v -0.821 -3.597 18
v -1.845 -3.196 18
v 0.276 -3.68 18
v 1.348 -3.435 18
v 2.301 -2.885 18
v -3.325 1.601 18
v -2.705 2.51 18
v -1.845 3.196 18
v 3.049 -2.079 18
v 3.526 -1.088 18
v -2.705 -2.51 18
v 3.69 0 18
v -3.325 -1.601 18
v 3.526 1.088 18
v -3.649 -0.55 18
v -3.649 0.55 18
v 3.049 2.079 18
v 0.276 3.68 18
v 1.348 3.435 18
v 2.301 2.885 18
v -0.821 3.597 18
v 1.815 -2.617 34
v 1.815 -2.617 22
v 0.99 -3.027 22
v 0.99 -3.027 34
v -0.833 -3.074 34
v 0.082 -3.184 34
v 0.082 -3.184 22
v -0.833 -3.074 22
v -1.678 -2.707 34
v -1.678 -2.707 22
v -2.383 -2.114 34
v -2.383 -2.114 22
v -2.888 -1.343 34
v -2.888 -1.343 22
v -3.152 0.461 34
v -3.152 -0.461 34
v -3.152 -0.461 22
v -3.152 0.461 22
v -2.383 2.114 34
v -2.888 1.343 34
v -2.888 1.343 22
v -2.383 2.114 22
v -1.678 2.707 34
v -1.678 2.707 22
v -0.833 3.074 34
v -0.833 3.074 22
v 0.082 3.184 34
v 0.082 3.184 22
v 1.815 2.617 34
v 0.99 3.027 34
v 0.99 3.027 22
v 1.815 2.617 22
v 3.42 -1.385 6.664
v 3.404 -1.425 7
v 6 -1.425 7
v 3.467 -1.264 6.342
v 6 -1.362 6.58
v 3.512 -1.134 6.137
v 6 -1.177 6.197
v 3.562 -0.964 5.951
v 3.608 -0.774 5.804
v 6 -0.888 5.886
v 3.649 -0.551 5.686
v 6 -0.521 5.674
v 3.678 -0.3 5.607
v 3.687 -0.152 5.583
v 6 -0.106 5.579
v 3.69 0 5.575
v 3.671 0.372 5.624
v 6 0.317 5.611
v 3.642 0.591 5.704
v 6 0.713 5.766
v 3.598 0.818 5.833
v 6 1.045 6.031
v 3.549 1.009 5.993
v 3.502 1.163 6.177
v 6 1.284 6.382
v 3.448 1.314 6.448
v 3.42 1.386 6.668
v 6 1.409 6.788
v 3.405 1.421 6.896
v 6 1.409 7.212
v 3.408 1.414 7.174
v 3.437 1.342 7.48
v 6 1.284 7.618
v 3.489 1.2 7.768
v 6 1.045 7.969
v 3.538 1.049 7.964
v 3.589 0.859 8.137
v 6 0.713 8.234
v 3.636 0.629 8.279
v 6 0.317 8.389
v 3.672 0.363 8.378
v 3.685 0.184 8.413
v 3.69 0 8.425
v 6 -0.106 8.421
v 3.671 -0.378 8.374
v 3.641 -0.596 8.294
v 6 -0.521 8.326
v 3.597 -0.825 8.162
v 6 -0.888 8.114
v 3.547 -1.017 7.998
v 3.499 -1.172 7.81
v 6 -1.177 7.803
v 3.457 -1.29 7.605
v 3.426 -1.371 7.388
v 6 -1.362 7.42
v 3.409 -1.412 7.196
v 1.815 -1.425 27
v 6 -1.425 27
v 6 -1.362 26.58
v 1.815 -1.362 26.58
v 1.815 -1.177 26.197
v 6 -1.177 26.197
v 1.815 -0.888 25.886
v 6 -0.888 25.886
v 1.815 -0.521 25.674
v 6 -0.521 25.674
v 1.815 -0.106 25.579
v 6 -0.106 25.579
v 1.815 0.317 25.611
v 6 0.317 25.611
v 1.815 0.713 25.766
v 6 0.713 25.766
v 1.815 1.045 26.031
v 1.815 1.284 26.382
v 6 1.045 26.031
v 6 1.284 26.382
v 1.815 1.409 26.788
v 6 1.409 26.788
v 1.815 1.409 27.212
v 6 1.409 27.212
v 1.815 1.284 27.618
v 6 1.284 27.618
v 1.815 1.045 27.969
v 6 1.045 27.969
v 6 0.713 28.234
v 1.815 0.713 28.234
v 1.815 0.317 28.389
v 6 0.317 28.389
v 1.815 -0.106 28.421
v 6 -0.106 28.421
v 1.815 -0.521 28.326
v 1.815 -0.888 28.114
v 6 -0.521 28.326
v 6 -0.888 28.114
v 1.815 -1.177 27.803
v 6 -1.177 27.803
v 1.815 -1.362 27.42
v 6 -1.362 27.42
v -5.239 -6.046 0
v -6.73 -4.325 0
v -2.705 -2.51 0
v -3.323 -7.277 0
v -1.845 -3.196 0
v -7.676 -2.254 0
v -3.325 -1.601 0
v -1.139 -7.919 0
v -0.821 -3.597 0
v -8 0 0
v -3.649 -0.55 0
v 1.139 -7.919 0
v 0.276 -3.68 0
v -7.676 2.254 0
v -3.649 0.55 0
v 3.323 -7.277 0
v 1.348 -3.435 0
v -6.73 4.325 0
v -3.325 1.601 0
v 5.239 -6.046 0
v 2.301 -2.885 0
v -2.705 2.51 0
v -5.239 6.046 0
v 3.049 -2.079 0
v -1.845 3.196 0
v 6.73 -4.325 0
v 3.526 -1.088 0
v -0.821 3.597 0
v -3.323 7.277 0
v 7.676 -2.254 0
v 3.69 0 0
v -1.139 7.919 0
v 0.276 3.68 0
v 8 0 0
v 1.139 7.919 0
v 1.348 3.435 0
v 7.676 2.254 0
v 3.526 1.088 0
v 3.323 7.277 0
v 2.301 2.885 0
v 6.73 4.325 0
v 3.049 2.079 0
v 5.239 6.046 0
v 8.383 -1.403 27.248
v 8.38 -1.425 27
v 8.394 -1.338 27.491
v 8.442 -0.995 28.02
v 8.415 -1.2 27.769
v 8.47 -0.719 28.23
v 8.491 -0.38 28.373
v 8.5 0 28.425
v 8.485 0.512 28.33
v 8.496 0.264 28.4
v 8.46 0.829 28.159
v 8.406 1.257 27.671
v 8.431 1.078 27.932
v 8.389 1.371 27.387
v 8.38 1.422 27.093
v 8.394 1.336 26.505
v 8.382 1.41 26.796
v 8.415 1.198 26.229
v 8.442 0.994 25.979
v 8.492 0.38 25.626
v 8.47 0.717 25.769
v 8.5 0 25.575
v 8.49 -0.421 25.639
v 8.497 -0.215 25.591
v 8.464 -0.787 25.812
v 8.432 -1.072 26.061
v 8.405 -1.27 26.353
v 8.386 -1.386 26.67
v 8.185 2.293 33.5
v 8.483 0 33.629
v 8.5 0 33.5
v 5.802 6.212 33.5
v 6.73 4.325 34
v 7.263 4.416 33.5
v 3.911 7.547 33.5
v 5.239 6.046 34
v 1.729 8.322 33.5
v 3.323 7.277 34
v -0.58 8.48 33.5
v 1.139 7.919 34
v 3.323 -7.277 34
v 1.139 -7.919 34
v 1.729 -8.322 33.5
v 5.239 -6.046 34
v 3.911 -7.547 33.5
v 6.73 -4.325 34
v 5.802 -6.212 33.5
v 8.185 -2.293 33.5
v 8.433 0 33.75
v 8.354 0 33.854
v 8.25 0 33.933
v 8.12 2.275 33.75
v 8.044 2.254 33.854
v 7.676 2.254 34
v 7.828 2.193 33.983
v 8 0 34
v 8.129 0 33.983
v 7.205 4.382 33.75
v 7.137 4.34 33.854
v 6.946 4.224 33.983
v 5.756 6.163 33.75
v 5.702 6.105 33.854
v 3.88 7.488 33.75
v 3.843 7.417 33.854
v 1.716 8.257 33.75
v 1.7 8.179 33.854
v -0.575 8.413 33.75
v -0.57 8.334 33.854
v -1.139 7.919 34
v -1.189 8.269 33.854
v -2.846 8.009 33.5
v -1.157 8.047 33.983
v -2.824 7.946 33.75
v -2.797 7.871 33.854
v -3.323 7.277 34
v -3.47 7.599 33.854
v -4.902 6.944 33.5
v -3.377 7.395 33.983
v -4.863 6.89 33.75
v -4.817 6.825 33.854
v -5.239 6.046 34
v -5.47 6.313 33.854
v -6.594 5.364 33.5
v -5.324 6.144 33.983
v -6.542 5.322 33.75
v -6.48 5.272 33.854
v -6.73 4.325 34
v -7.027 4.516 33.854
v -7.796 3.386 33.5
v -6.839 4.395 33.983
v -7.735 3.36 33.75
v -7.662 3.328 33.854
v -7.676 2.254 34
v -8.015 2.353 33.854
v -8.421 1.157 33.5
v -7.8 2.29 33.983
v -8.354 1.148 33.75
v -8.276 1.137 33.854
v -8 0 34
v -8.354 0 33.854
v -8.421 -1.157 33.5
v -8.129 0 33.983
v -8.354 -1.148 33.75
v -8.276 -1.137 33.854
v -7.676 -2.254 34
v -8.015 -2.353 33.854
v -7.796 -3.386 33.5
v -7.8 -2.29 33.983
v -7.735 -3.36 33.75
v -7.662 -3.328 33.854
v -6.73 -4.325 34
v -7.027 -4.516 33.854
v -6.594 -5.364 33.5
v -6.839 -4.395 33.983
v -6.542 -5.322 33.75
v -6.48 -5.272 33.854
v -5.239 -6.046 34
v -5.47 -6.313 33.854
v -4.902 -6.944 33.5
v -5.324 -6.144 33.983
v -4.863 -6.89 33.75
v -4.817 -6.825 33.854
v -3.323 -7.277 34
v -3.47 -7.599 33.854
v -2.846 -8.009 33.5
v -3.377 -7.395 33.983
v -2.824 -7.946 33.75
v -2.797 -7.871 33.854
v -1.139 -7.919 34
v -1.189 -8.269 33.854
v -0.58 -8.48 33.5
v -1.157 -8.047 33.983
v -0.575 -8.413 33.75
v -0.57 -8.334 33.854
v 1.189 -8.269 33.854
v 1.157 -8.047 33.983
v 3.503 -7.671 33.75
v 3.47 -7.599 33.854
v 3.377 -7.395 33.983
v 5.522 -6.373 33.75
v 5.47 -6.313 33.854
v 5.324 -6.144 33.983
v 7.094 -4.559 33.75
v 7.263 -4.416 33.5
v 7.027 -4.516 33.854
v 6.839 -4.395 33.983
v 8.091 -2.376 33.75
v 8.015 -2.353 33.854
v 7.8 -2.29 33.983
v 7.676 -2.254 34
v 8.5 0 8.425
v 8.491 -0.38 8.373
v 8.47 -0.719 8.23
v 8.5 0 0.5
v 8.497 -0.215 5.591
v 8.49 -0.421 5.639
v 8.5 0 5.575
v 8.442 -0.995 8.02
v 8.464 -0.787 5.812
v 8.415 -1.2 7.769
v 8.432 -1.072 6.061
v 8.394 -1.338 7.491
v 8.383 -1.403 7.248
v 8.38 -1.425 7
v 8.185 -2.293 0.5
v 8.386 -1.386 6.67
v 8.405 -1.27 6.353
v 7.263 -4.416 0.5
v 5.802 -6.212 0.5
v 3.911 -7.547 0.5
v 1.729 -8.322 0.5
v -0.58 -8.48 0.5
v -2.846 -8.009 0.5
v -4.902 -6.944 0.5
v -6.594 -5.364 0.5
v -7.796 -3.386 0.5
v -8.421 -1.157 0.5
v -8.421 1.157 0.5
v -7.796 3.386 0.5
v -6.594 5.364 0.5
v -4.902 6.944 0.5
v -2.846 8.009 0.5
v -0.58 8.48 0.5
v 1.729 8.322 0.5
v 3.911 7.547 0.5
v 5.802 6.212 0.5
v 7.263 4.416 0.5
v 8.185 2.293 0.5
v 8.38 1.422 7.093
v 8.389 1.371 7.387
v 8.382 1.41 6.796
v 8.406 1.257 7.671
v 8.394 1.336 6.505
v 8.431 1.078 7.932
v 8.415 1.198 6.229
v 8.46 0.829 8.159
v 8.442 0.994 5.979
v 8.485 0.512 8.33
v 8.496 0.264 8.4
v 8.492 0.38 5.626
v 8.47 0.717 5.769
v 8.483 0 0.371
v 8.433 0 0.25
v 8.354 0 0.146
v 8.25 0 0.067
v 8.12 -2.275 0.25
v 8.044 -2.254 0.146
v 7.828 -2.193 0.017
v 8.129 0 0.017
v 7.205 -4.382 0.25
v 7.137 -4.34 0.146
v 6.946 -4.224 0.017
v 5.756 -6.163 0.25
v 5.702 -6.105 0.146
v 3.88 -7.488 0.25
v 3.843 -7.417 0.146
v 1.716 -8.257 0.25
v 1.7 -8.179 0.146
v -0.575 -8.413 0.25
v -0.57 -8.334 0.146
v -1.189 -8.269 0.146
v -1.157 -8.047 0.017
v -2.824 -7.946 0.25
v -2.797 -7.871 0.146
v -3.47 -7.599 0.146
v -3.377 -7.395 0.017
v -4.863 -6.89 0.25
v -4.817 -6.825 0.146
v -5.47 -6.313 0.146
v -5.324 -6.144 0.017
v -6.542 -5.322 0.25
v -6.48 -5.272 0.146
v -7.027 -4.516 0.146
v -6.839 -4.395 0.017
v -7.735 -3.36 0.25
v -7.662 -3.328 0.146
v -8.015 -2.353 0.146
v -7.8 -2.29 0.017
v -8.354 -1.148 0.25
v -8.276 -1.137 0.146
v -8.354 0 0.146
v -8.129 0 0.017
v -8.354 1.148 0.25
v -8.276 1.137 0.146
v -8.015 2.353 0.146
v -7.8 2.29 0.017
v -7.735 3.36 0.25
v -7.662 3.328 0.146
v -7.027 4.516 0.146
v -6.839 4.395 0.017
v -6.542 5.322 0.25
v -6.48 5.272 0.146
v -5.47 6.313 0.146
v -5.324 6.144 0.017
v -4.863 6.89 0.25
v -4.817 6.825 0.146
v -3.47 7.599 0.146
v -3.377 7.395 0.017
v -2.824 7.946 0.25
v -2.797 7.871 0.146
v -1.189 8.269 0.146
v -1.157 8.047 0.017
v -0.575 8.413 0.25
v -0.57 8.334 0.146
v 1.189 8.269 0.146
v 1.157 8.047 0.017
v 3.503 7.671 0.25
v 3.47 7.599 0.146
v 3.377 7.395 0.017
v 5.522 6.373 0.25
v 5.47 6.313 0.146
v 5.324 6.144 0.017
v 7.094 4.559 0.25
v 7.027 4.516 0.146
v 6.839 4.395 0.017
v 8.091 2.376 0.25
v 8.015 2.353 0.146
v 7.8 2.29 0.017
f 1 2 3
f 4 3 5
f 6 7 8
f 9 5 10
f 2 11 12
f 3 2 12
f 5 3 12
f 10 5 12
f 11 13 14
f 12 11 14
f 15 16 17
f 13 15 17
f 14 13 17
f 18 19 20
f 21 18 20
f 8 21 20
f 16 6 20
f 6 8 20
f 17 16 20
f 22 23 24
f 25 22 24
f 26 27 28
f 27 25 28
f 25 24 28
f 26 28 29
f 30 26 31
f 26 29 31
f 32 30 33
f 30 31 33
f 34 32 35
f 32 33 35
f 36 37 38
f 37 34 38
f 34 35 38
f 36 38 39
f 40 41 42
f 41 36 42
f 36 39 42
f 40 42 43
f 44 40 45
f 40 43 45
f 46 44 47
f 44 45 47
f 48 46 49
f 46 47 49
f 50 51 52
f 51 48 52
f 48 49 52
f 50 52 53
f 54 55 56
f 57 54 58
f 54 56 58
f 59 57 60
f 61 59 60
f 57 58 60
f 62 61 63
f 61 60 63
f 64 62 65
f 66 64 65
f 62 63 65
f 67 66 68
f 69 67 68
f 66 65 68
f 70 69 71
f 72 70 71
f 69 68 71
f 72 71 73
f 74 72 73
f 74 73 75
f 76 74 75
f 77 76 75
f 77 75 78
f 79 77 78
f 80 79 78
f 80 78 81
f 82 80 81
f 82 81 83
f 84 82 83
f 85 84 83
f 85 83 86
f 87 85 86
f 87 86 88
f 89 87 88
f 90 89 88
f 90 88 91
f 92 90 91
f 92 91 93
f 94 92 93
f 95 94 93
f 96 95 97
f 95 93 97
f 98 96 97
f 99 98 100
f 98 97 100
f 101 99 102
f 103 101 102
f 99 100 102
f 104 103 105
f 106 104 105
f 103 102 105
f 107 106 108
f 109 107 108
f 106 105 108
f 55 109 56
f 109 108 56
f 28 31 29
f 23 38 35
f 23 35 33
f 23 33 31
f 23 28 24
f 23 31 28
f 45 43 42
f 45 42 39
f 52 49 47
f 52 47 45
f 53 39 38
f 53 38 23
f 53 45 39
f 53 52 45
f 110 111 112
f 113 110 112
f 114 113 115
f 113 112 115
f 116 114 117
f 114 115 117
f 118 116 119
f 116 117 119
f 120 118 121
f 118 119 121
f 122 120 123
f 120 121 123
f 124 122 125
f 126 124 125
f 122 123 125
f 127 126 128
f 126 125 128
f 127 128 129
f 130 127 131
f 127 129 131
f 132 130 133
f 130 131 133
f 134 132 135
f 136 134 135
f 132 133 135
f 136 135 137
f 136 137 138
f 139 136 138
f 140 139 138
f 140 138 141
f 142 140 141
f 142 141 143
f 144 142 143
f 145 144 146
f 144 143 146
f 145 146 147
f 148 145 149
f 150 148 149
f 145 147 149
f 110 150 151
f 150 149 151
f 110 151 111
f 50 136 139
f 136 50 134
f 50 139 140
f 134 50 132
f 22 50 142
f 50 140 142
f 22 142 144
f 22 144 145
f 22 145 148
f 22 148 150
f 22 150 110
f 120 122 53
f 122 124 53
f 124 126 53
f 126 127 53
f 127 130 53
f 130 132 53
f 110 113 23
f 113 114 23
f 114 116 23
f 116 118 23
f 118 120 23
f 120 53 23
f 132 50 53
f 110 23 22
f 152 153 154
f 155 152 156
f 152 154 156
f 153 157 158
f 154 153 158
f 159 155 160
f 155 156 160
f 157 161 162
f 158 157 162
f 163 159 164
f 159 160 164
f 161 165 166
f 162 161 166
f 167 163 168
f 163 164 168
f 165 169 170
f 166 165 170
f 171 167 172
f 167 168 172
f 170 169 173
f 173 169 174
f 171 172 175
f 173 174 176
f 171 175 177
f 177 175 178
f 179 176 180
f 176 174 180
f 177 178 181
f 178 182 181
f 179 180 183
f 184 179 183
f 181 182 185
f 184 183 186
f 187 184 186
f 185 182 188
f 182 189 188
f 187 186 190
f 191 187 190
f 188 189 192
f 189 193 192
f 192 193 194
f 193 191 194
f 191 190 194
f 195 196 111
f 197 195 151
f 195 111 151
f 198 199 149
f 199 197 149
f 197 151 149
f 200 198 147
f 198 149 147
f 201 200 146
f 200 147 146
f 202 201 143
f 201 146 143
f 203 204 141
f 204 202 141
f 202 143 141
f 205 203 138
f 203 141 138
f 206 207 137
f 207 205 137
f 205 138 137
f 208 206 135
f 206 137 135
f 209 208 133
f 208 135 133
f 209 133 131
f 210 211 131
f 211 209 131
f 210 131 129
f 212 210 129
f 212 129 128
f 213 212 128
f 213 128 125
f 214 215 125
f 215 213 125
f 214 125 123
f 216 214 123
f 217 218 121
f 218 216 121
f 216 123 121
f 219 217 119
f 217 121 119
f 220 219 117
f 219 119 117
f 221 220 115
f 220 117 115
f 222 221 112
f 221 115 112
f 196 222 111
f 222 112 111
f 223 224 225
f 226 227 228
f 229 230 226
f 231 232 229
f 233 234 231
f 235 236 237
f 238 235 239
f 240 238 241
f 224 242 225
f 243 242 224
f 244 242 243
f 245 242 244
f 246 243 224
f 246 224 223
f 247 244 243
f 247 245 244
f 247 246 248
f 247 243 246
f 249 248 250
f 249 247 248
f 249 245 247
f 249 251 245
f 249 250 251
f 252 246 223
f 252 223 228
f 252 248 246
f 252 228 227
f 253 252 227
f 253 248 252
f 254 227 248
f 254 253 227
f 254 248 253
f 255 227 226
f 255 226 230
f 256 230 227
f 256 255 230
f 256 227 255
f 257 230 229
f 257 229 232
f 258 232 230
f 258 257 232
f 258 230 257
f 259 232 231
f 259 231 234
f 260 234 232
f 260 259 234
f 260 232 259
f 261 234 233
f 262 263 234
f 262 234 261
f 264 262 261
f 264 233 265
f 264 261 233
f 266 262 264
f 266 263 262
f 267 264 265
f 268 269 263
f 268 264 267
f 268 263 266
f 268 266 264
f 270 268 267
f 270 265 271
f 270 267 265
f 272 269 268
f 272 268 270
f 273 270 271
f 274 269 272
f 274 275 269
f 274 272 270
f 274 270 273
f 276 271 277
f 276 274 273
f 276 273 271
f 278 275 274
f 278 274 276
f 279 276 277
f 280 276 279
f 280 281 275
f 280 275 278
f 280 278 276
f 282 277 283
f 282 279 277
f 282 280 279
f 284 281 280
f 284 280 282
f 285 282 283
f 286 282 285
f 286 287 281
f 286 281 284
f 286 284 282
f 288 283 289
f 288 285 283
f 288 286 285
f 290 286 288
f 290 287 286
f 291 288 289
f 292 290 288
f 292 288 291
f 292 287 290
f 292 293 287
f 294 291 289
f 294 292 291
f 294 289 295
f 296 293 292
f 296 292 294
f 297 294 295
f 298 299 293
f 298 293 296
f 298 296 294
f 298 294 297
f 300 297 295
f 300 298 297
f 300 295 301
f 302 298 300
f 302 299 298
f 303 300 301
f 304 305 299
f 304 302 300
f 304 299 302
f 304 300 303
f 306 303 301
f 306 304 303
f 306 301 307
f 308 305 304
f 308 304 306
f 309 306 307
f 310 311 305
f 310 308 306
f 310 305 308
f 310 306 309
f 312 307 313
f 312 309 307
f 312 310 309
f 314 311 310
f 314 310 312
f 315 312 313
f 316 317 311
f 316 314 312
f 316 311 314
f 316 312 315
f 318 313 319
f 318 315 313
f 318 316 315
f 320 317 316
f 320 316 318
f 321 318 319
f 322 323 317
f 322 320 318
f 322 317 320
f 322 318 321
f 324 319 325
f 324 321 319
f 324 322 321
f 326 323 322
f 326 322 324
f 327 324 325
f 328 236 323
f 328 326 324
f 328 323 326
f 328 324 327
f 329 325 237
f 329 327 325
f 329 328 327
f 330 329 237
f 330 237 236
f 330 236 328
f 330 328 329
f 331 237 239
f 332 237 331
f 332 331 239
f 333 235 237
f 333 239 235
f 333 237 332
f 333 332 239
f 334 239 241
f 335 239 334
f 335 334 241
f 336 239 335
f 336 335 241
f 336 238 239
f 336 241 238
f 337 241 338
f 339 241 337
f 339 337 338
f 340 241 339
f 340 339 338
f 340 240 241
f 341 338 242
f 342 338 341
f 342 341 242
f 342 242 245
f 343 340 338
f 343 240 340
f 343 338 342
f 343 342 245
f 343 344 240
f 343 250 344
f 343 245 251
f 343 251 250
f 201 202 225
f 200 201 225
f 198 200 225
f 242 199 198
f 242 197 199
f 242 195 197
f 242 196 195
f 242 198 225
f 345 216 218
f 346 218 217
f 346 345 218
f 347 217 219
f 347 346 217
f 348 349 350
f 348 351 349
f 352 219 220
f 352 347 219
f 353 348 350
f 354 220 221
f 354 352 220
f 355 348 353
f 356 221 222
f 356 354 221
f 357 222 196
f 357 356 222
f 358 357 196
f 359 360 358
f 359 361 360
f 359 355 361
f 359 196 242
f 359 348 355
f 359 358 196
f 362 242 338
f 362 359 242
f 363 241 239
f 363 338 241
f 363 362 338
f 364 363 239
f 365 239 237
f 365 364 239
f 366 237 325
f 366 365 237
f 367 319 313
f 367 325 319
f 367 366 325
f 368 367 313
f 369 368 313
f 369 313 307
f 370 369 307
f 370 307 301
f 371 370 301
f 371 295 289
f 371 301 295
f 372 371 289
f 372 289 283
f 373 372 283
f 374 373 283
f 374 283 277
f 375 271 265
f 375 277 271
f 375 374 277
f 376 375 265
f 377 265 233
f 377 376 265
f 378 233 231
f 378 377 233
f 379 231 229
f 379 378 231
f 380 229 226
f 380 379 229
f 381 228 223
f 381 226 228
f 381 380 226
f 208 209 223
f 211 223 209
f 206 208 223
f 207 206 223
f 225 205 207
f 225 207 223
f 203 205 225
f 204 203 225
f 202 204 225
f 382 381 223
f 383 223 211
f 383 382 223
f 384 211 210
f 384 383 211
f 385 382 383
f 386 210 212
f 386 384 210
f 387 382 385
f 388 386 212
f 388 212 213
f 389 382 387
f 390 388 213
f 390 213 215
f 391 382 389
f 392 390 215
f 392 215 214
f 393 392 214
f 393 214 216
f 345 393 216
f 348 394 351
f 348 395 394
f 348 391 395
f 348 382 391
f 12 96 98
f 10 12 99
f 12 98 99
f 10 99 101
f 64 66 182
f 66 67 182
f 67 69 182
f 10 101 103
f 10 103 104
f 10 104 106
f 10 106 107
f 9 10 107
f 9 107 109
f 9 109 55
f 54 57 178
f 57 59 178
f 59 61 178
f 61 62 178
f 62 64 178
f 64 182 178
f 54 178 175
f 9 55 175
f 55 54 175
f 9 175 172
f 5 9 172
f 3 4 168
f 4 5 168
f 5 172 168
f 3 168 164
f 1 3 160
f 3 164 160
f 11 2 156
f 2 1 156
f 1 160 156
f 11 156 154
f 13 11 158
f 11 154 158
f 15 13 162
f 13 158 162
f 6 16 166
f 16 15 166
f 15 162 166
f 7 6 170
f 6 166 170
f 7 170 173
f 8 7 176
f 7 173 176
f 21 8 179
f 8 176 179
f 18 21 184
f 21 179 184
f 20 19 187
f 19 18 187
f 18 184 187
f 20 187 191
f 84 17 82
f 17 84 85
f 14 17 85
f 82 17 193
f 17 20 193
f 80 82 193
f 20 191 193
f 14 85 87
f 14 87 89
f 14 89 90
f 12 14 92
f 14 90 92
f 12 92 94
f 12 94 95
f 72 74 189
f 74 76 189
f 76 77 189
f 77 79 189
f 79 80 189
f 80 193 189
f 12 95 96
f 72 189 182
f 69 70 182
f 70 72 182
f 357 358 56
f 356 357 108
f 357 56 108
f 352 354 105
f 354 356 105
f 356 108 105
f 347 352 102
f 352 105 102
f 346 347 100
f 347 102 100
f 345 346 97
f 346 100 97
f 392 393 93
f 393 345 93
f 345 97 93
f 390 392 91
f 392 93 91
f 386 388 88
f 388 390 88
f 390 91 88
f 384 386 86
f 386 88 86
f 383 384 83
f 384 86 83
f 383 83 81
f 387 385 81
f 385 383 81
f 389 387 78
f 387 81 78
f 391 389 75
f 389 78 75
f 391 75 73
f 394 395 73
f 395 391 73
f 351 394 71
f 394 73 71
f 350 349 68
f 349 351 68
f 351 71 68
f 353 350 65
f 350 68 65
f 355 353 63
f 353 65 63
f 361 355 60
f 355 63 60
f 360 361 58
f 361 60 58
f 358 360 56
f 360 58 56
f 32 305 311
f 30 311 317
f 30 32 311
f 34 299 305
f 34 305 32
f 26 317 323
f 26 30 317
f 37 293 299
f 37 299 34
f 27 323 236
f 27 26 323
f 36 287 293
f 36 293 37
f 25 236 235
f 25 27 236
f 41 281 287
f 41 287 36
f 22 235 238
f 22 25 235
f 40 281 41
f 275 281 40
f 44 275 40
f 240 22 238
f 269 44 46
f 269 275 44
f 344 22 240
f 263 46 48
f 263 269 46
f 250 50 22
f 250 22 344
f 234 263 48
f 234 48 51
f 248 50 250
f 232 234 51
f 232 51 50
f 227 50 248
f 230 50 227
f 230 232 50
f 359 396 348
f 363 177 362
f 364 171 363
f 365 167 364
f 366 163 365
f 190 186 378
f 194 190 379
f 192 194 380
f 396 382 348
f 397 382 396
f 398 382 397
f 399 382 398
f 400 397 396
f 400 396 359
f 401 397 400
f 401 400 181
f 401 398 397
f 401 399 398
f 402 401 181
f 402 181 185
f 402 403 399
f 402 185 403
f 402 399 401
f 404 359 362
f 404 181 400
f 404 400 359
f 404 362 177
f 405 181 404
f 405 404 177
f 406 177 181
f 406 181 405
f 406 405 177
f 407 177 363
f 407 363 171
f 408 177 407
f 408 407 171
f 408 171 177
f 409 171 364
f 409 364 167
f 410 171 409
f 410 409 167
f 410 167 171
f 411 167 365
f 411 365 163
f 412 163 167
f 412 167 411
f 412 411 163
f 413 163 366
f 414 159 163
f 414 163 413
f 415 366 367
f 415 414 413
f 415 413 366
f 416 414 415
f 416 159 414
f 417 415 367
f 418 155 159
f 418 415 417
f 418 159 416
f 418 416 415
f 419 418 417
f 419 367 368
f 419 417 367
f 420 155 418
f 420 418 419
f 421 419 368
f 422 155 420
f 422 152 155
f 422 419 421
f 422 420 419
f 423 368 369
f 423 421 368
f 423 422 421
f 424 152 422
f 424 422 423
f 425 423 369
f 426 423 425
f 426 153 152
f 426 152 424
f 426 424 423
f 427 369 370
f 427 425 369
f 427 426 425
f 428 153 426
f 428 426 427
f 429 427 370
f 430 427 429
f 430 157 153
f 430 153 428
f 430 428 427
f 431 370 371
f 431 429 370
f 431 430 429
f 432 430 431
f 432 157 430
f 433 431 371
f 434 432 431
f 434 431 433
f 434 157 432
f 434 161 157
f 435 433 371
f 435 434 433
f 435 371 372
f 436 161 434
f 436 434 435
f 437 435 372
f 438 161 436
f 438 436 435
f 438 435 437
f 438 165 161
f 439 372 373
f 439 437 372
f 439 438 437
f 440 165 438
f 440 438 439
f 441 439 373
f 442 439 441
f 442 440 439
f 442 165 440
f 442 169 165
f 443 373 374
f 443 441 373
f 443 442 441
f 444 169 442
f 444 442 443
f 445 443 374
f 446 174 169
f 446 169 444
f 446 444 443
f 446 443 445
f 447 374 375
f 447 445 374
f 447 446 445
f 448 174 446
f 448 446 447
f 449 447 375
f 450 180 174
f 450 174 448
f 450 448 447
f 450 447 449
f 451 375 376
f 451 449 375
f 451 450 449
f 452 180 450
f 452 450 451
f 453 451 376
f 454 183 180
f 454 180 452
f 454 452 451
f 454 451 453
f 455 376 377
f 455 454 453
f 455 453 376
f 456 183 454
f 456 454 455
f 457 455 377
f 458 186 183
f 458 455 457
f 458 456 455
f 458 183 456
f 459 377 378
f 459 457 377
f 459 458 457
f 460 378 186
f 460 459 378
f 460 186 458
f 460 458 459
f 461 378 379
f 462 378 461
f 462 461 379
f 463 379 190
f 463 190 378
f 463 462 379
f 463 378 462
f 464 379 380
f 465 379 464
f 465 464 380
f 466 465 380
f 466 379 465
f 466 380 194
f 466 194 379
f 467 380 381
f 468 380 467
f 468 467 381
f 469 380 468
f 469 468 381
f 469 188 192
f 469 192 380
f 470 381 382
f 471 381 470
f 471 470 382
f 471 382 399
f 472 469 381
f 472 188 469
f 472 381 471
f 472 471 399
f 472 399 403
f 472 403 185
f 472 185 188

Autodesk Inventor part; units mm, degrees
ref_plane "YZ Plane" through (0, 0, 0) normal (1, 0, 0) x (0, 1, 0)
ref_plane "XZ Plane" through (0, 0, 0) normal (0, 1, 0) x (-1, 0, 0)
sketch "Sketch1" plane through (0, 0, 0) normal (0, 0, 1) x (1, 0, 0)
  circle A0 centre (0, 0) radius 8.5
  circle A1 centre (0, 0) radius 3.69
  dimension "d0" = 17
  dimension "d3" = 7.38
  dimension "d20" = 4.81
extrude "Extrusion2" add sketch "Sketch1" along normal blind 18
sketch "Sketch2" plane through (0, 0, 18) normal (0, 0, 1) x (1, 0, 0)
  circle A0 centre (0, 0) radius 8.5
  circle A1 centre (0, 0) radius 8.5 projected
extrude "Extrusion3" add sketch "Sketch2" along normal blind 4
sketch "Sketch3" plane through (0, 0, 22) normal (0, 0, 1) x (1, 0, 0)
  arc A0 (1.815, 2.6173) -> (1.815, -2.6173) centre (0, 0) ccw
  circle A1 centre (0, 0) radius 8.5
  line L0 (1.815, 2.6173) -> (1.815, -2.6173)
  circle A2 centre (0, 0) radius 8.5 projected
  dimension "d8" = 6.37
  dimension "d11" = 5
  dimension "d12" = 1.815
extrude "Extrusion4" add sketch "Sketch3" along normal blind 12
ref_plane "Work Plane2" through (6, -1.3086, 34) normal (1, 0, 0) x (0, -1, 0)
ref_plane "Work Plane1" through (1.815, -1.3086, 34) normal (1, 0, 0) x (0, -1, 0)
sketch "Sketch4" plane through (6, -1.3086, 34) normal (1, 0, 0) x (0, -1, 0)
  circle A0 centre (-1.3086, 7) radius 1.425
  circle A1 centre (-1.3086, 27) radius 1.425
  line L0 (-9.8086, 0) -> (7.1914, 0) projected
  line L1 (7.1914, 34) -> (-9.8086, 34) projected
  point P0 (-1.3086, 34)
  dimension "d14" = 2.85
  dimension "d15" = 7
  dimension "d16" = 7
extrude "Extrusion5" cut sketch "Sketch4" along normal blind 6.185 and the other way blind 5
fillet "Fillet1" radius 0.5 2 edges at (-8.5, 0, 34) (-8.5, 0, 0)
properties part number "schroefkoppeling motor en overbrening"
